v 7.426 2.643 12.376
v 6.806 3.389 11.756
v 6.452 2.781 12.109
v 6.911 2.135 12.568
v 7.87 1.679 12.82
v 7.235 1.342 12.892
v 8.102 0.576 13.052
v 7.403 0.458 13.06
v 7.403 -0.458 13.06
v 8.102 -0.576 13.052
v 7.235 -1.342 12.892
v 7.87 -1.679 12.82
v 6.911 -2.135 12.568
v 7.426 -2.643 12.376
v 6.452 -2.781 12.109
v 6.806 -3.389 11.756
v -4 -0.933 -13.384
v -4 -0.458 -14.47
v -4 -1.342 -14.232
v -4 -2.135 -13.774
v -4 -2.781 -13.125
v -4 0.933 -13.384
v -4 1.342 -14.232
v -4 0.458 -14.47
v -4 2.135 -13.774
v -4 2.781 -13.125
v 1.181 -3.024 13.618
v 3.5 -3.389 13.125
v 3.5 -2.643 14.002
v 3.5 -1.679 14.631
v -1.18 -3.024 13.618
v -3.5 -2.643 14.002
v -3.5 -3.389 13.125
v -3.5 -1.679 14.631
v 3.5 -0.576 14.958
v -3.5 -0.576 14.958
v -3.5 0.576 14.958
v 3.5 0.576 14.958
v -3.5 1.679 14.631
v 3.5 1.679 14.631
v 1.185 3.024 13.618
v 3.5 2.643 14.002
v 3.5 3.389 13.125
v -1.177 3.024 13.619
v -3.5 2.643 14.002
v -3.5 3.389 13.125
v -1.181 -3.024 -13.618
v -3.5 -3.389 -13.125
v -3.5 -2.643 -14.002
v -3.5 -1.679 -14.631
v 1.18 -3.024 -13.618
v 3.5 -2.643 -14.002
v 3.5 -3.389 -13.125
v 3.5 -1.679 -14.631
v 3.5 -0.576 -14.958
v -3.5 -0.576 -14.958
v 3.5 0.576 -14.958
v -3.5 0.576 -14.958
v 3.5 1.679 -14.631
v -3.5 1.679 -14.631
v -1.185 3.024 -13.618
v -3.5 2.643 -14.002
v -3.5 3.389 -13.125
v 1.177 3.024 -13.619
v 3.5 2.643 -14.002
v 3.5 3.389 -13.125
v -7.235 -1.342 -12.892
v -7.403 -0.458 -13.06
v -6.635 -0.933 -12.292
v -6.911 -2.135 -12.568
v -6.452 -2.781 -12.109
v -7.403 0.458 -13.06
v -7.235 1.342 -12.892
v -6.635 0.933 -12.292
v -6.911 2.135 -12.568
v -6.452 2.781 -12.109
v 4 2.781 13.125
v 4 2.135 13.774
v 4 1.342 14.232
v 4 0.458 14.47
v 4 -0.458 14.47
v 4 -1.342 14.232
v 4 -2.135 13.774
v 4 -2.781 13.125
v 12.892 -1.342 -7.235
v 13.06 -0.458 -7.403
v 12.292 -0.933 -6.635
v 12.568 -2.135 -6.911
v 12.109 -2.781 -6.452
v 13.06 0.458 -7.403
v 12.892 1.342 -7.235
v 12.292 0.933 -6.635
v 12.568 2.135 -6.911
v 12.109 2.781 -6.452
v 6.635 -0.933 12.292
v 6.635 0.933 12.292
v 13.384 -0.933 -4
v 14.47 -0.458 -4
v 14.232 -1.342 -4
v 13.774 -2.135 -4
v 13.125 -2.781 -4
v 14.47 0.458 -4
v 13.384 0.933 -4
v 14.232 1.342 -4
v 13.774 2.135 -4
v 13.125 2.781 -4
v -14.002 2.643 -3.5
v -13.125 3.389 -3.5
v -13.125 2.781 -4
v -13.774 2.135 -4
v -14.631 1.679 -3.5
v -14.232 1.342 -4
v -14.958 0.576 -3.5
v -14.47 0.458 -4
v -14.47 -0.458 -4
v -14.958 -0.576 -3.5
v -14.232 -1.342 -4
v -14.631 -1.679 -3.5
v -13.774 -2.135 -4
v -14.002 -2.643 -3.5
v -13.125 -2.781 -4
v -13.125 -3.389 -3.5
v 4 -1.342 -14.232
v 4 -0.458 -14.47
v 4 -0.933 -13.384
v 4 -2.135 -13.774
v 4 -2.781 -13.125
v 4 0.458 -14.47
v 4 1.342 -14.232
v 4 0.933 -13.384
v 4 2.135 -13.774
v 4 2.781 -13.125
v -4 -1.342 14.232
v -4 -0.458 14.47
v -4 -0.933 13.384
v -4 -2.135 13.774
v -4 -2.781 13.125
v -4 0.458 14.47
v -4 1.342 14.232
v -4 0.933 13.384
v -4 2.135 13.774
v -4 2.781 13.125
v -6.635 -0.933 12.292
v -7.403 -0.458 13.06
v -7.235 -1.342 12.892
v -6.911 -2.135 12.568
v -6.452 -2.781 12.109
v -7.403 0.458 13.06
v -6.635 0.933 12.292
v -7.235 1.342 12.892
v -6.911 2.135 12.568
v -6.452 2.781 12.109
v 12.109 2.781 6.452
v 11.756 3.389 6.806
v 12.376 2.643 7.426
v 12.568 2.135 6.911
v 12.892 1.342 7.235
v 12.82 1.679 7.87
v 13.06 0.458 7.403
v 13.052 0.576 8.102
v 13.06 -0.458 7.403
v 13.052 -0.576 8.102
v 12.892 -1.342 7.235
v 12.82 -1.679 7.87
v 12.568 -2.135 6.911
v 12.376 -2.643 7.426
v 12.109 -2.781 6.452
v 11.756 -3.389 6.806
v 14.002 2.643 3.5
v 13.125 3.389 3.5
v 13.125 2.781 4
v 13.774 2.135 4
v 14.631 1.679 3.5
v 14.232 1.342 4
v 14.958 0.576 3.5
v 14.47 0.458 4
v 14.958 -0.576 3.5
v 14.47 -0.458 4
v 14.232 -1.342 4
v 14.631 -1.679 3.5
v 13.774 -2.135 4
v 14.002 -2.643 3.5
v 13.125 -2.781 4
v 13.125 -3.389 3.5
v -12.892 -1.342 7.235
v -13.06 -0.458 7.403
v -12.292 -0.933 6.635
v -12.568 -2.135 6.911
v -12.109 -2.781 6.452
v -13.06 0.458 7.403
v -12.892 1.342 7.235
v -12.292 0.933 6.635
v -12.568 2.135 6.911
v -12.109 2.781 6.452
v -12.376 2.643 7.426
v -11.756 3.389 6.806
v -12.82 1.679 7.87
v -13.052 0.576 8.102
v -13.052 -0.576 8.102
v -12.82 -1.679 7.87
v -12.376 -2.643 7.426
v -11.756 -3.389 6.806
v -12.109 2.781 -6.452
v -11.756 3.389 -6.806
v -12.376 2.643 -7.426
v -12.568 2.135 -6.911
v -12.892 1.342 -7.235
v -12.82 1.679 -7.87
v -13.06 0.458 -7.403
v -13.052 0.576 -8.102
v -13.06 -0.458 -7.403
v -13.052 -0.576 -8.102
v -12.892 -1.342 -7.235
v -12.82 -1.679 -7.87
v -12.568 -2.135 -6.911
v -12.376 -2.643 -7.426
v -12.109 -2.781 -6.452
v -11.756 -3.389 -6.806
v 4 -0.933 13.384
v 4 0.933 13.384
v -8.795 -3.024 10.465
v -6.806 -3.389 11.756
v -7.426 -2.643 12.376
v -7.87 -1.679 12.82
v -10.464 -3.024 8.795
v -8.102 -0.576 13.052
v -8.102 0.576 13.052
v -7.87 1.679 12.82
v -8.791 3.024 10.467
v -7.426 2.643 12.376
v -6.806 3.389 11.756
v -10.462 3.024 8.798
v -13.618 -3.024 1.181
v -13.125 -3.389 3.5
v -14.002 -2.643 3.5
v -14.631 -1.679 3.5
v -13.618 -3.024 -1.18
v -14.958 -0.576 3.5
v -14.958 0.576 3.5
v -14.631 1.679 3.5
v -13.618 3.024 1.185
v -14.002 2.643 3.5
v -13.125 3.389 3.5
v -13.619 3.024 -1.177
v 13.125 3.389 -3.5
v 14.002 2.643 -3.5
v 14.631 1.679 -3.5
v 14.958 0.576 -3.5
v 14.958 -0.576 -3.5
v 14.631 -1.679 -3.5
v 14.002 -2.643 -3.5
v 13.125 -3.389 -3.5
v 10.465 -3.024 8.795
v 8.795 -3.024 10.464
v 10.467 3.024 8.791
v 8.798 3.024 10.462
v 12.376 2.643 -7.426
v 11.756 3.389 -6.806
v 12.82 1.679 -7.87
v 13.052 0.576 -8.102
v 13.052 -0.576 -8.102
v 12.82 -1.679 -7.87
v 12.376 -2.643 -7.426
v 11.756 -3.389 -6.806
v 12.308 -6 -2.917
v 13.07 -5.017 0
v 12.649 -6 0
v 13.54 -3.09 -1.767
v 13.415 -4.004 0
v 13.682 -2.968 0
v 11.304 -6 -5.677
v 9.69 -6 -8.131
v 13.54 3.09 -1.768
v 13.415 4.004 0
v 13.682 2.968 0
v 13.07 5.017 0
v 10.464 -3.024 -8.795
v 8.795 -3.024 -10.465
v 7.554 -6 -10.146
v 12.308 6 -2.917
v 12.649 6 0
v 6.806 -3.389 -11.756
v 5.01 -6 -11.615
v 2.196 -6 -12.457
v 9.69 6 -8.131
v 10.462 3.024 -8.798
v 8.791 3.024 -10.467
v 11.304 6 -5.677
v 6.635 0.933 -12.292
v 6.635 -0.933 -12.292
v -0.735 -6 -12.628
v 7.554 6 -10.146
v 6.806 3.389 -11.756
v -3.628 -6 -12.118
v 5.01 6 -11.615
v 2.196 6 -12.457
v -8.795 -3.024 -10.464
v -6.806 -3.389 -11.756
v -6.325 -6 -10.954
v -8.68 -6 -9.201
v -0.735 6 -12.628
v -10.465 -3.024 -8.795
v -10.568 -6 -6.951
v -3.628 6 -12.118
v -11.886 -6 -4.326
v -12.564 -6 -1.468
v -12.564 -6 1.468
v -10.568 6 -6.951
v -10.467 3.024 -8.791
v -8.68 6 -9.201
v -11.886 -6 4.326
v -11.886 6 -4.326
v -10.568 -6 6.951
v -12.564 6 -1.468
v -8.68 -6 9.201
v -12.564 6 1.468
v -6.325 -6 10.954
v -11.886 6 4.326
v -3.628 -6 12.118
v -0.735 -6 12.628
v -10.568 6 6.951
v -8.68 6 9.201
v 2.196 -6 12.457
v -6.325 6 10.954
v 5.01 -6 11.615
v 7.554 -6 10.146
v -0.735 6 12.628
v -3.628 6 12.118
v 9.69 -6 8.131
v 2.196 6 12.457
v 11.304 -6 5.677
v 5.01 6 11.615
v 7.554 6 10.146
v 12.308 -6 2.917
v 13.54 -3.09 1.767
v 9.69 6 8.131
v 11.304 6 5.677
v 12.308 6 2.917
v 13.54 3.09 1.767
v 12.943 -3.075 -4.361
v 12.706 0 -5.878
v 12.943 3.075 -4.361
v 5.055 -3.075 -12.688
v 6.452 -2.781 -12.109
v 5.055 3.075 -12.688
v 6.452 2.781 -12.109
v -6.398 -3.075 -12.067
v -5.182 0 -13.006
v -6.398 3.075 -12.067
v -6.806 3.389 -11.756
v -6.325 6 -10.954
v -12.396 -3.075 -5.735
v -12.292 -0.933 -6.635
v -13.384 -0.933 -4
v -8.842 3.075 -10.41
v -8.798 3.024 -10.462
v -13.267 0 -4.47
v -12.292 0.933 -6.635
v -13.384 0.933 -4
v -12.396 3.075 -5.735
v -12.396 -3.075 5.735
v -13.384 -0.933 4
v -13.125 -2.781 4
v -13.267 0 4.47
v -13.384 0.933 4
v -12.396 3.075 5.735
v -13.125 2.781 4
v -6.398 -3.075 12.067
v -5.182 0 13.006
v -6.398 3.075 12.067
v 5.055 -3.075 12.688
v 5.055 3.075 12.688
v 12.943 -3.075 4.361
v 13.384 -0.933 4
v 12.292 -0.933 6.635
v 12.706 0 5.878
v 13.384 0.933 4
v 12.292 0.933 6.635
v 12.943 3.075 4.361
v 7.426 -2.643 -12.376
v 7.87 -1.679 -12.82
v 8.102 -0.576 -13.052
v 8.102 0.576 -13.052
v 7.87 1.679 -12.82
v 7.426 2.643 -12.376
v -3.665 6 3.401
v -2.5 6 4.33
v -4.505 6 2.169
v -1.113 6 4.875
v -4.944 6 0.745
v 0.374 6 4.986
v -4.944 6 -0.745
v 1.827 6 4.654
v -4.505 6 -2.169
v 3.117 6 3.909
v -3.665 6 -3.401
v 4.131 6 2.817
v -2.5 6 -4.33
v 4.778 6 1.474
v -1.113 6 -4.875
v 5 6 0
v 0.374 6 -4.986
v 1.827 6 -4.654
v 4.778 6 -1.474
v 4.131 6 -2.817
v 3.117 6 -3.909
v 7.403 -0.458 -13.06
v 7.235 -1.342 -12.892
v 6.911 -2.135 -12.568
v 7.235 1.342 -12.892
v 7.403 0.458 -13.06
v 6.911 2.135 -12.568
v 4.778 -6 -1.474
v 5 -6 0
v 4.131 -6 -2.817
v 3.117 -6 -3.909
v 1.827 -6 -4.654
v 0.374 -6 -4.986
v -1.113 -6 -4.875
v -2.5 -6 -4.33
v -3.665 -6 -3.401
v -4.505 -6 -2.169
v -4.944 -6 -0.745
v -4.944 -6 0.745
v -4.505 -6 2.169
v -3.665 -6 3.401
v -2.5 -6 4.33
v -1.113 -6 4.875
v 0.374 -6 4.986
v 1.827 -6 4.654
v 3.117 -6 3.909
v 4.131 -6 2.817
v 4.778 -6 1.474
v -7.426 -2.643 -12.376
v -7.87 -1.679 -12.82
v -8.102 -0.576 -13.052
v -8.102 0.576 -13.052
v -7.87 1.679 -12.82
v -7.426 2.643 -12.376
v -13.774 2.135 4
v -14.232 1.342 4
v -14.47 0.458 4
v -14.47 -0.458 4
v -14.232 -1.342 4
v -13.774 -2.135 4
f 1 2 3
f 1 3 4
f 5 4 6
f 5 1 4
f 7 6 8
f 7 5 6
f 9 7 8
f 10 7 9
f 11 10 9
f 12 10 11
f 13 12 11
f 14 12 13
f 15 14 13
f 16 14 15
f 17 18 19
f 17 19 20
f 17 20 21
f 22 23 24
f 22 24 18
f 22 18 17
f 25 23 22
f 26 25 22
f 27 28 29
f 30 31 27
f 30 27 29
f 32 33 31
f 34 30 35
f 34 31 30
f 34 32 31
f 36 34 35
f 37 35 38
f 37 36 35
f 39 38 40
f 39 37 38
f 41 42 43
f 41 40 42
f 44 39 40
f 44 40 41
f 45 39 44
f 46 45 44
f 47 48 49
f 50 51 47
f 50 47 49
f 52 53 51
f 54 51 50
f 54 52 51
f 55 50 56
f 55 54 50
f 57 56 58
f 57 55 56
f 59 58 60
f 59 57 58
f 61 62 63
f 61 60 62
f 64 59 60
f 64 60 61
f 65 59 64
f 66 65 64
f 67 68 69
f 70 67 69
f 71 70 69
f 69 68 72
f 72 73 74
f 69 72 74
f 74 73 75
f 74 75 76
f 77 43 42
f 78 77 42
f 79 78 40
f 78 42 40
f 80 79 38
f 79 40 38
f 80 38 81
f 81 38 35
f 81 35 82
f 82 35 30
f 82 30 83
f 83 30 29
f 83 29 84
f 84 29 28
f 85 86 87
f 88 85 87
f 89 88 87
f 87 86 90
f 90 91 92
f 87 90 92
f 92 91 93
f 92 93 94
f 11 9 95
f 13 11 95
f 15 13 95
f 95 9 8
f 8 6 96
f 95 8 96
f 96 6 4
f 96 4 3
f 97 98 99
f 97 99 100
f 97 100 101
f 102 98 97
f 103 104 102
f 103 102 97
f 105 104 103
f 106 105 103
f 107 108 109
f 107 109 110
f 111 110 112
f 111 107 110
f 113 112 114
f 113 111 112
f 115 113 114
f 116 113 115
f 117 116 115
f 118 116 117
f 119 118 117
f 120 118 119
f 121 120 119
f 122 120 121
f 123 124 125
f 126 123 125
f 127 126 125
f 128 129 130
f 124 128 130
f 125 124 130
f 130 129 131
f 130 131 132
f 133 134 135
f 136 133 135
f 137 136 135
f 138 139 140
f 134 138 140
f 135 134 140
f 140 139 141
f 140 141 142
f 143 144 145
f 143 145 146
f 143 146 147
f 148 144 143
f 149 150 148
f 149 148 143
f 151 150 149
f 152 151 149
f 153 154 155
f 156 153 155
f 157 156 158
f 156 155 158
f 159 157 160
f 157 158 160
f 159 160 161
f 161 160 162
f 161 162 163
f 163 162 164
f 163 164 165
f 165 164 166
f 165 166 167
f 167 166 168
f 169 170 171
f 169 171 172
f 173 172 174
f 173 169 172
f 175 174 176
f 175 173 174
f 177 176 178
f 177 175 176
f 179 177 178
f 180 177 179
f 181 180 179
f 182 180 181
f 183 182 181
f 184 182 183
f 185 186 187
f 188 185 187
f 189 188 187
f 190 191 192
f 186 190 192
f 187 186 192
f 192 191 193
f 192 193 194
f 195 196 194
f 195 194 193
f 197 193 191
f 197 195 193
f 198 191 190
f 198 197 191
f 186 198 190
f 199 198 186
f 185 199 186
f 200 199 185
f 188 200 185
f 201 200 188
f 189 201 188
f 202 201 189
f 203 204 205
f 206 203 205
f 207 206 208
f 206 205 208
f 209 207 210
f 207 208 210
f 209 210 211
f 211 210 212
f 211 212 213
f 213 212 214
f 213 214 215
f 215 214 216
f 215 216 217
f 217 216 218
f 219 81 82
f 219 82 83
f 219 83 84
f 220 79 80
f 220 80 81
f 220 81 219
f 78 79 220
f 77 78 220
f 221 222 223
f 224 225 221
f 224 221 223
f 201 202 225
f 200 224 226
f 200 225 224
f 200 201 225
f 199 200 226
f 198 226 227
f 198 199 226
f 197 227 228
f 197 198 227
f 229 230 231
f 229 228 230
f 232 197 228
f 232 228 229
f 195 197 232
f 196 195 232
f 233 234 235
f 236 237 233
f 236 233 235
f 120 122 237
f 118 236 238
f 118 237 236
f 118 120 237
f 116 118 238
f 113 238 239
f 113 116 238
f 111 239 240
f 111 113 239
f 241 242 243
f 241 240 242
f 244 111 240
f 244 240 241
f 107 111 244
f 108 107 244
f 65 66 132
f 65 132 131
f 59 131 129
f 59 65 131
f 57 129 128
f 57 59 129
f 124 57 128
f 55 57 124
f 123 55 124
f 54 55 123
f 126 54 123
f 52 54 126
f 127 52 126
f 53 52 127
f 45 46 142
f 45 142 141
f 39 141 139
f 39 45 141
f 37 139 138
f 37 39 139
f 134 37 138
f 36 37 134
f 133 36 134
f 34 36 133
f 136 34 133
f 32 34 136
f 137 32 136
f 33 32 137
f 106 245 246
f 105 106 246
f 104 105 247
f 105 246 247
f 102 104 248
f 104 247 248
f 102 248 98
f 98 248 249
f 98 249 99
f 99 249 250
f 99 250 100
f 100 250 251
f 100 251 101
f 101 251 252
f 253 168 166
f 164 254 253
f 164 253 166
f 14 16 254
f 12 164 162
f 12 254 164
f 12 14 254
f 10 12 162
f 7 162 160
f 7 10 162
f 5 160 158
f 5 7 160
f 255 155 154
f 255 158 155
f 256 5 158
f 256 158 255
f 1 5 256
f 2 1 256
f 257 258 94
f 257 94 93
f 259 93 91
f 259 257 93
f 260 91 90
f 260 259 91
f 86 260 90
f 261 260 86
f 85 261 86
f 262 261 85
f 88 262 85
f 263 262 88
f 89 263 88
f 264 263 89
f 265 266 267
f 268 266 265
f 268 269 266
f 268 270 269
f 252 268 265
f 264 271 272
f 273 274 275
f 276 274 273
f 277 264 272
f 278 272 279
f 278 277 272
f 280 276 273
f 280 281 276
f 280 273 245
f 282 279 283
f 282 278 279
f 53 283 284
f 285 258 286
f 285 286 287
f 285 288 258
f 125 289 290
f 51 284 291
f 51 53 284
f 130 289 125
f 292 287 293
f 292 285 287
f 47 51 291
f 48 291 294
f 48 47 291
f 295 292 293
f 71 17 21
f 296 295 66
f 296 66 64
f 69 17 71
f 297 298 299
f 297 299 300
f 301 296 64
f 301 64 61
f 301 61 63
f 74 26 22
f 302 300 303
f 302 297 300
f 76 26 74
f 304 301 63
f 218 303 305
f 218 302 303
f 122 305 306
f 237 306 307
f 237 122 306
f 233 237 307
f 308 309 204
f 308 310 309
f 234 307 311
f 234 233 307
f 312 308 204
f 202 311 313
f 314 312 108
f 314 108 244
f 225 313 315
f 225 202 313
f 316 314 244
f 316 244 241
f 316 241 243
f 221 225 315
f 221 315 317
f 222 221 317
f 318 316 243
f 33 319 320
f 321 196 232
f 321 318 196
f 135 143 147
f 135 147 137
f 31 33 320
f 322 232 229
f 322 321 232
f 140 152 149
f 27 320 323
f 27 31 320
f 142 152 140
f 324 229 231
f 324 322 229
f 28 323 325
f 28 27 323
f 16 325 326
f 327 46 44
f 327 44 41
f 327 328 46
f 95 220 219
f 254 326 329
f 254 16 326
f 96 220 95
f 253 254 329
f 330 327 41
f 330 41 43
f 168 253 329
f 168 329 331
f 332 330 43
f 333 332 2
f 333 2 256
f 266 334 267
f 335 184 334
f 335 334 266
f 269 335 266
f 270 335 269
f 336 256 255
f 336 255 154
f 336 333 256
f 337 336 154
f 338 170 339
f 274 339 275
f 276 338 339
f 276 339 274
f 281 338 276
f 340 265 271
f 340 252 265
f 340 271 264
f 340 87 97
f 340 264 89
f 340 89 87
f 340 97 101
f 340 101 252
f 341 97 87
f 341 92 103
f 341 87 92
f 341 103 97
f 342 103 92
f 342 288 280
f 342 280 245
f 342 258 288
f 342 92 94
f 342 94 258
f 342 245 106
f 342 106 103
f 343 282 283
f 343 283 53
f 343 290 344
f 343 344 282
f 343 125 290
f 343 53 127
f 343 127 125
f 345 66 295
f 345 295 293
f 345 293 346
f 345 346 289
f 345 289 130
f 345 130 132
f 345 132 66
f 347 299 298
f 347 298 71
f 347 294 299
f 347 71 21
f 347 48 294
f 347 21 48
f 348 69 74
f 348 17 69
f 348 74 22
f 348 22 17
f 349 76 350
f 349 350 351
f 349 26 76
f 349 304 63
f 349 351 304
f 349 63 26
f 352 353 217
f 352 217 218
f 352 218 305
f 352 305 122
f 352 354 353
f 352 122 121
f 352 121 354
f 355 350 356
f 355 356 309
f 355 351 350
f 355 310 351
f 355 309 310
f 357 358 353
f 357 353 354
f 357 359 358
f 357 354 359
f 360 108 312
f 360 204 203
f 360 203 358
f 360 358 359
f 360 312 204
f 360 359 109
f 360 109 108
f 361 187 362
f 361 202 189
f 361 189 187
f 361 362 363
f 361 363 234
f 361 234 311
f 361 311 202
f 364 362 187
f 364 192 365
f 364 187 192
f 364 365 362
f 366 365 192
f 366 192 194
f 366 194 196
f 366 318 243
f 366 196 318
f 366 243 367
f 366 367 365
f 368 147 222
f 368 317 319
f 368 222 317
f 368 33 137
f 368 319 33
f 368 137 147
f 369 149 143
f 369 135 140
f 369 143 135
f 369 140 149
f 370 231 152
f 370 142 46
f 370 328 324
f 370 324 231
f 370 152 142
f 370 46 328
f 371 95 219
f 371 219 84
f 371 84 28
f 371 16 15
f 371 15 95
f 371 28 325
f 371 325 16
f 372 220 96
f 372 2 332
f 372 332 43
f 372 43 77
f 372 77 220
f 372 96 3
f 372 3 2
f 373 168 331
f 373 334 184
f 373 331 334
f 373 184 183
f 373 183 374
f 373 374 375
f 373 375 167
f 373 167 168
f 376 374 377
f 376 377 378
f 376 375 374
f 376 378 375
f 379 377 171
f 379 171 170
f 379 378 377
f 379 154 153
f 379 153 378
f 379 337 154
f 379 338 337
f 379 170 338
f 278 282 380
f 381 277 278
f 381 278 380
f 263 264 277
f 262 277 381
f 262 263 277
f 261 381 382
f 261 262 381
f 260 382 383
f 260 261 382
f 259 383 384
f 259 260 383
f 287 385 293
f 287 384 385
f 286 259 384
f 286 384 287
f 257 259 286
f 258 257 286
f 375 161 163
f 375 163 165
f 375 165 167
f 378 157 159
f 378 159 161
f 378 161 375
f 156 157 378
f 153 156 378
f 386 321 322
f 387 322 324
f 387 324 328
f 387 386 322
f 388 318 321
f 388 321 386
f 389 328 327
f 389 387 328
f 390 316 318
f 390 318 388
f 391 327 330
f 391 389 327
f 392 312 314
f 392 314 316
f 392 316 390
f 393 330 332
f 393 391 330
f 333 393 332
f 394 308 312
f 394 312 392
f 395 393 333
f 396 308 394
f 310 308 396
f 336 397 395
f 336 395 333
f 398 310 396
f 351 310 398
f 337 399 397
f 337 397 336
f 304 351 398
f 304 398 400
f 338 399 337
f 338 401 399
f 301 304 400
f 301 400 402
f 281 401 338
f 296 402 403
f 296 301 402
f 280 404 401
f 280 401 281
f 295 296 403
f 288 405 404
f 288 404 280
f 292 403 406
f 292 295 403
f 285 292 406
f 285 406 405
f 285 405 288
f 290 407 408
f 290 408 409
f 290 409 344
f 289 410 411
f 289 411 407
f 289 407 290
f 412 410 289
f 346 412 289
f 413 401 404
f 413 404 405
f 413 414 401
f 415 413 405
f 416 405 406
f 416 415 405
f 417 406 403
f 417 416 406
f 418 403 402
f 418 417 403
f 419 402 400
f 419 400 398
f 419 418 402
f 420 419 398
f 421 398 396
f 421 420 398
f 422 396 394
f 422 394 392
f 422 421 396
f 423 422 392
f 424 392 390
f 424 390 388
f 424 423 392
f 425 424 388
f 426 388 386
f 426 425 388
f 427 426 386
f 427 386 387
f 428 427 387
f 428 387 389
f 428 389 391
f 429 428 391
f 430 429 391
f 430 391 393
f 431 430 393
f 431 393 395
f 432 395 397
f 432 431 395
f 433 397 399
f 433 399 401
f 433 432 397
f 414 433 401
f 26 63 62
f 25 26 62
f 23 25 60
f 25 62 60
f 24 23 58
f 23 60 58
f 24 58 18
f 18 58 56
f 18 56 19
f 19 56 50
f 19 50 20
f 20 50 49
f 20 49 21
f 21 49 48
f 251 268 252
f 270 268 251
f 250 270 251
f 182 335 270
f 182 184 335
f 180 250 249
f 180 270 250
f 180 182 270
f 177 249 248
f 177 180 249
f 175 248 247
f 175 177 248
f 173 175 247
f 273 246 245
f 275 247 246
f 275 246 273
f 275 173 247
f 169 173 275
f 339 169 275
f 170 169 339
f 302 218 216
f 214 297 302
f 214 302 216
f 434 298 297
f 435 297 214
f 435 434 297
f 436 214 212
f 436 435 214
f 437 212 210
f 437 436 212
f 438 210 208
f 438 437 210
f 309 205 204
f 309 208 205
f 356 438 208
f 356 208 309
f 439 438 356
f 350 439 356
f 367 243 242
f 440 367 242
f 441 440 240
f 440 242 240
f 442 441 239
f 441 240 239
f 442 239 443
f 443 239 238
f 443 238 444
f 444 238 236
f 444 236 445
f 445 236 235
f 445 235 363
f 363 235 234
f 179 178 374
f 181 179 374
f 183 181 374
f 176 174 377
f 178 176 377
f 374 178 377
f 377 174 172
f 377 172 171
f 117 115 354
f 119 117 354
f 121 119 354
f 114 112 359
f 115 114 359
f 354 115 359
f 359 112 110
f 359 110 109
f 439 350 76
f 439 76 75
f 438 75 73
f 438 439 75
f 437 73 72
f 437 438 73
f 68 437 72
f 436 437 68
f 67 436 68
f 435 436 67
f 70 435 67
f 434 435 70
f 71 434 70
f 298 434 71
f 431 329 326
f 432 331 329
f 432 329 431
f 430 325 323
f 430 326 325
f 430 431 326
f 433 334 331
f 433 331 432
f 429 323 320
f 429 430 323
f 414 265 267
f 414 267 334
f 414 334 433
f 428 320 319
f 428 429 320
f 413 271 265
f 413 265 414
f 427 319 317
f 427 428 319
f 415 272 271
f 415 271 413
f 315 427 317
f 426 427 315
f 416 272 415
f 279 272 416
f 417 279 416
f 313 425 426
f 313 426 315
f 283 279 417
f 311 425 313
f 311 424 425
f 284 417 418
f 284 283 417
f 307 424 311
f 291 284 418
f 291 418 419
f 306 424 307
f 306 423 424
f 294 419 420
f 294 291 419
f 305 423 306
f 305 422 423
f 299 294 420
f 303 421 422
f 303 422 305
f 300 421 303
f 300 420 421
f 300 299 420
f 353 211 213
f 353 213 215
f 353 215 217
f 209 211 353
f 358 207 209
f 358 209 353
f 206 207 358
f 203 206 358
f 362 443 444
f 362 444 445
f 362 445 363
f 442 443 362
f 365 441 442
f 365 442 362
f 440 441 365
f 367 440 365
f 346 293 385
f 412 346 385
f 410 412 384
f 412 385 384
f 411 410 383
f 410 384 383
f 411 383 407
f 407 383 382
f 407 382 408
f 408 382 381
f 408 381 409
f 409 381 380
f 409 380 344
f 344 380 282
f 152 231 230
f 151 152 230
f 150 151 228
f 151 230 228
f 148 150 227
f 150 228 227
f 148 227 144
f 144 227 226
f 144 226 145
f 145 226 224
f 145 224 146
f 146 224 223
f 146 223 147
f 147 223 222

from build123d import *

# Parameters (mm, degrees)
SKETCH_3_W                           = 8
SKETCH_3_H                           = 4
CHAMFER_1_SIZE                       = 0.5
PATTERN_CIRCULAR_1_COUNT             = 8
CHAMFER_1_OF_PATTERN_CIRCULAR_1_SIZE = 0.5


with BuildPart() as part:
    # 草图5 → 旋转1 (revolve)
    with BuildSketch(Plane.XY):
        with BuildLine():
            Line((5, 6), (5, -6))
            Line((5, -6), (12.649110641, -6))
            ThreePointArc((12.649110641, -6), (14, 0), (12.649110641, 6))
            Line((12.649110641, 6), (5, 6))
        make_face()
    revolve(axis=Axis((0, 0, 0), (0, 1, 0)))

    # 草图3 → 旋转2 (revolve)
    with BuildSketch(Plane(origin=(0, 0, 0), x_dir=(1, 0, 0), z_dir=(0, 1, 0))):
        with Locations((0, 13)):
            Rectangle(SKETCH_3_W, SKETCH_3_H)
    revolve_2 = revolve(axis=Axis((-4, 0, -11), (1, 0, 0)))

    # 倒角1
    chamfer_1_edges = [part.edges().sort_by_distance(p)[0] for p in [
        (-4, 0, -15),
        (4, 0, -15),
    ]]
    chamfer(chamfer_1_edges, length=CHAMFER_1_SIZE)

    # 阵列(圆周)1: 旋转2 ×8 about axis
    pattern_circular_1_axis = Axis((0, 0, 0), (0, 1, 0))
    for i in range(1, PATTERN_CIRCULAR_1_COUNT):
        add(revolve_2.rotate(pattern_circular_1_axis, i * 360 / PATTERN_CIRCULAR_1_COUNT))

    # 倒角1 of 阵列(圆周)1
    chamfer_1_of_pattern_circular_1_edges = [part.edges().sort_by_distance(p)[0] for p in [
        (-13.435028843, 0, -7.778174593),
        (-7.778174593, 0, -13.435028843),
        (-15, 0, 4),
        (-15, 0, -4),
        (-7.778174593, 0, 13.435028843),
        (-13.435028843, 0, 7.778174593),
        (4, 0, 15),
        (-4, 0, 15),
        (13.435028843, 0, 7.778174593),
        (7.778174593, 0, 13.435028843),
        (15, 0, -4),
        (15, 0, 4),
        (7.778174593, 0, -13.435028843),
        (13.435028843, 0, -7.778174593),
    ]]
    chamfer(chamfer_1_of_pattern_circular_1_edges, length=CHAMFER_1_OF_PATTERN_CIRCULAR_1_SIZE)


solid = part.part
